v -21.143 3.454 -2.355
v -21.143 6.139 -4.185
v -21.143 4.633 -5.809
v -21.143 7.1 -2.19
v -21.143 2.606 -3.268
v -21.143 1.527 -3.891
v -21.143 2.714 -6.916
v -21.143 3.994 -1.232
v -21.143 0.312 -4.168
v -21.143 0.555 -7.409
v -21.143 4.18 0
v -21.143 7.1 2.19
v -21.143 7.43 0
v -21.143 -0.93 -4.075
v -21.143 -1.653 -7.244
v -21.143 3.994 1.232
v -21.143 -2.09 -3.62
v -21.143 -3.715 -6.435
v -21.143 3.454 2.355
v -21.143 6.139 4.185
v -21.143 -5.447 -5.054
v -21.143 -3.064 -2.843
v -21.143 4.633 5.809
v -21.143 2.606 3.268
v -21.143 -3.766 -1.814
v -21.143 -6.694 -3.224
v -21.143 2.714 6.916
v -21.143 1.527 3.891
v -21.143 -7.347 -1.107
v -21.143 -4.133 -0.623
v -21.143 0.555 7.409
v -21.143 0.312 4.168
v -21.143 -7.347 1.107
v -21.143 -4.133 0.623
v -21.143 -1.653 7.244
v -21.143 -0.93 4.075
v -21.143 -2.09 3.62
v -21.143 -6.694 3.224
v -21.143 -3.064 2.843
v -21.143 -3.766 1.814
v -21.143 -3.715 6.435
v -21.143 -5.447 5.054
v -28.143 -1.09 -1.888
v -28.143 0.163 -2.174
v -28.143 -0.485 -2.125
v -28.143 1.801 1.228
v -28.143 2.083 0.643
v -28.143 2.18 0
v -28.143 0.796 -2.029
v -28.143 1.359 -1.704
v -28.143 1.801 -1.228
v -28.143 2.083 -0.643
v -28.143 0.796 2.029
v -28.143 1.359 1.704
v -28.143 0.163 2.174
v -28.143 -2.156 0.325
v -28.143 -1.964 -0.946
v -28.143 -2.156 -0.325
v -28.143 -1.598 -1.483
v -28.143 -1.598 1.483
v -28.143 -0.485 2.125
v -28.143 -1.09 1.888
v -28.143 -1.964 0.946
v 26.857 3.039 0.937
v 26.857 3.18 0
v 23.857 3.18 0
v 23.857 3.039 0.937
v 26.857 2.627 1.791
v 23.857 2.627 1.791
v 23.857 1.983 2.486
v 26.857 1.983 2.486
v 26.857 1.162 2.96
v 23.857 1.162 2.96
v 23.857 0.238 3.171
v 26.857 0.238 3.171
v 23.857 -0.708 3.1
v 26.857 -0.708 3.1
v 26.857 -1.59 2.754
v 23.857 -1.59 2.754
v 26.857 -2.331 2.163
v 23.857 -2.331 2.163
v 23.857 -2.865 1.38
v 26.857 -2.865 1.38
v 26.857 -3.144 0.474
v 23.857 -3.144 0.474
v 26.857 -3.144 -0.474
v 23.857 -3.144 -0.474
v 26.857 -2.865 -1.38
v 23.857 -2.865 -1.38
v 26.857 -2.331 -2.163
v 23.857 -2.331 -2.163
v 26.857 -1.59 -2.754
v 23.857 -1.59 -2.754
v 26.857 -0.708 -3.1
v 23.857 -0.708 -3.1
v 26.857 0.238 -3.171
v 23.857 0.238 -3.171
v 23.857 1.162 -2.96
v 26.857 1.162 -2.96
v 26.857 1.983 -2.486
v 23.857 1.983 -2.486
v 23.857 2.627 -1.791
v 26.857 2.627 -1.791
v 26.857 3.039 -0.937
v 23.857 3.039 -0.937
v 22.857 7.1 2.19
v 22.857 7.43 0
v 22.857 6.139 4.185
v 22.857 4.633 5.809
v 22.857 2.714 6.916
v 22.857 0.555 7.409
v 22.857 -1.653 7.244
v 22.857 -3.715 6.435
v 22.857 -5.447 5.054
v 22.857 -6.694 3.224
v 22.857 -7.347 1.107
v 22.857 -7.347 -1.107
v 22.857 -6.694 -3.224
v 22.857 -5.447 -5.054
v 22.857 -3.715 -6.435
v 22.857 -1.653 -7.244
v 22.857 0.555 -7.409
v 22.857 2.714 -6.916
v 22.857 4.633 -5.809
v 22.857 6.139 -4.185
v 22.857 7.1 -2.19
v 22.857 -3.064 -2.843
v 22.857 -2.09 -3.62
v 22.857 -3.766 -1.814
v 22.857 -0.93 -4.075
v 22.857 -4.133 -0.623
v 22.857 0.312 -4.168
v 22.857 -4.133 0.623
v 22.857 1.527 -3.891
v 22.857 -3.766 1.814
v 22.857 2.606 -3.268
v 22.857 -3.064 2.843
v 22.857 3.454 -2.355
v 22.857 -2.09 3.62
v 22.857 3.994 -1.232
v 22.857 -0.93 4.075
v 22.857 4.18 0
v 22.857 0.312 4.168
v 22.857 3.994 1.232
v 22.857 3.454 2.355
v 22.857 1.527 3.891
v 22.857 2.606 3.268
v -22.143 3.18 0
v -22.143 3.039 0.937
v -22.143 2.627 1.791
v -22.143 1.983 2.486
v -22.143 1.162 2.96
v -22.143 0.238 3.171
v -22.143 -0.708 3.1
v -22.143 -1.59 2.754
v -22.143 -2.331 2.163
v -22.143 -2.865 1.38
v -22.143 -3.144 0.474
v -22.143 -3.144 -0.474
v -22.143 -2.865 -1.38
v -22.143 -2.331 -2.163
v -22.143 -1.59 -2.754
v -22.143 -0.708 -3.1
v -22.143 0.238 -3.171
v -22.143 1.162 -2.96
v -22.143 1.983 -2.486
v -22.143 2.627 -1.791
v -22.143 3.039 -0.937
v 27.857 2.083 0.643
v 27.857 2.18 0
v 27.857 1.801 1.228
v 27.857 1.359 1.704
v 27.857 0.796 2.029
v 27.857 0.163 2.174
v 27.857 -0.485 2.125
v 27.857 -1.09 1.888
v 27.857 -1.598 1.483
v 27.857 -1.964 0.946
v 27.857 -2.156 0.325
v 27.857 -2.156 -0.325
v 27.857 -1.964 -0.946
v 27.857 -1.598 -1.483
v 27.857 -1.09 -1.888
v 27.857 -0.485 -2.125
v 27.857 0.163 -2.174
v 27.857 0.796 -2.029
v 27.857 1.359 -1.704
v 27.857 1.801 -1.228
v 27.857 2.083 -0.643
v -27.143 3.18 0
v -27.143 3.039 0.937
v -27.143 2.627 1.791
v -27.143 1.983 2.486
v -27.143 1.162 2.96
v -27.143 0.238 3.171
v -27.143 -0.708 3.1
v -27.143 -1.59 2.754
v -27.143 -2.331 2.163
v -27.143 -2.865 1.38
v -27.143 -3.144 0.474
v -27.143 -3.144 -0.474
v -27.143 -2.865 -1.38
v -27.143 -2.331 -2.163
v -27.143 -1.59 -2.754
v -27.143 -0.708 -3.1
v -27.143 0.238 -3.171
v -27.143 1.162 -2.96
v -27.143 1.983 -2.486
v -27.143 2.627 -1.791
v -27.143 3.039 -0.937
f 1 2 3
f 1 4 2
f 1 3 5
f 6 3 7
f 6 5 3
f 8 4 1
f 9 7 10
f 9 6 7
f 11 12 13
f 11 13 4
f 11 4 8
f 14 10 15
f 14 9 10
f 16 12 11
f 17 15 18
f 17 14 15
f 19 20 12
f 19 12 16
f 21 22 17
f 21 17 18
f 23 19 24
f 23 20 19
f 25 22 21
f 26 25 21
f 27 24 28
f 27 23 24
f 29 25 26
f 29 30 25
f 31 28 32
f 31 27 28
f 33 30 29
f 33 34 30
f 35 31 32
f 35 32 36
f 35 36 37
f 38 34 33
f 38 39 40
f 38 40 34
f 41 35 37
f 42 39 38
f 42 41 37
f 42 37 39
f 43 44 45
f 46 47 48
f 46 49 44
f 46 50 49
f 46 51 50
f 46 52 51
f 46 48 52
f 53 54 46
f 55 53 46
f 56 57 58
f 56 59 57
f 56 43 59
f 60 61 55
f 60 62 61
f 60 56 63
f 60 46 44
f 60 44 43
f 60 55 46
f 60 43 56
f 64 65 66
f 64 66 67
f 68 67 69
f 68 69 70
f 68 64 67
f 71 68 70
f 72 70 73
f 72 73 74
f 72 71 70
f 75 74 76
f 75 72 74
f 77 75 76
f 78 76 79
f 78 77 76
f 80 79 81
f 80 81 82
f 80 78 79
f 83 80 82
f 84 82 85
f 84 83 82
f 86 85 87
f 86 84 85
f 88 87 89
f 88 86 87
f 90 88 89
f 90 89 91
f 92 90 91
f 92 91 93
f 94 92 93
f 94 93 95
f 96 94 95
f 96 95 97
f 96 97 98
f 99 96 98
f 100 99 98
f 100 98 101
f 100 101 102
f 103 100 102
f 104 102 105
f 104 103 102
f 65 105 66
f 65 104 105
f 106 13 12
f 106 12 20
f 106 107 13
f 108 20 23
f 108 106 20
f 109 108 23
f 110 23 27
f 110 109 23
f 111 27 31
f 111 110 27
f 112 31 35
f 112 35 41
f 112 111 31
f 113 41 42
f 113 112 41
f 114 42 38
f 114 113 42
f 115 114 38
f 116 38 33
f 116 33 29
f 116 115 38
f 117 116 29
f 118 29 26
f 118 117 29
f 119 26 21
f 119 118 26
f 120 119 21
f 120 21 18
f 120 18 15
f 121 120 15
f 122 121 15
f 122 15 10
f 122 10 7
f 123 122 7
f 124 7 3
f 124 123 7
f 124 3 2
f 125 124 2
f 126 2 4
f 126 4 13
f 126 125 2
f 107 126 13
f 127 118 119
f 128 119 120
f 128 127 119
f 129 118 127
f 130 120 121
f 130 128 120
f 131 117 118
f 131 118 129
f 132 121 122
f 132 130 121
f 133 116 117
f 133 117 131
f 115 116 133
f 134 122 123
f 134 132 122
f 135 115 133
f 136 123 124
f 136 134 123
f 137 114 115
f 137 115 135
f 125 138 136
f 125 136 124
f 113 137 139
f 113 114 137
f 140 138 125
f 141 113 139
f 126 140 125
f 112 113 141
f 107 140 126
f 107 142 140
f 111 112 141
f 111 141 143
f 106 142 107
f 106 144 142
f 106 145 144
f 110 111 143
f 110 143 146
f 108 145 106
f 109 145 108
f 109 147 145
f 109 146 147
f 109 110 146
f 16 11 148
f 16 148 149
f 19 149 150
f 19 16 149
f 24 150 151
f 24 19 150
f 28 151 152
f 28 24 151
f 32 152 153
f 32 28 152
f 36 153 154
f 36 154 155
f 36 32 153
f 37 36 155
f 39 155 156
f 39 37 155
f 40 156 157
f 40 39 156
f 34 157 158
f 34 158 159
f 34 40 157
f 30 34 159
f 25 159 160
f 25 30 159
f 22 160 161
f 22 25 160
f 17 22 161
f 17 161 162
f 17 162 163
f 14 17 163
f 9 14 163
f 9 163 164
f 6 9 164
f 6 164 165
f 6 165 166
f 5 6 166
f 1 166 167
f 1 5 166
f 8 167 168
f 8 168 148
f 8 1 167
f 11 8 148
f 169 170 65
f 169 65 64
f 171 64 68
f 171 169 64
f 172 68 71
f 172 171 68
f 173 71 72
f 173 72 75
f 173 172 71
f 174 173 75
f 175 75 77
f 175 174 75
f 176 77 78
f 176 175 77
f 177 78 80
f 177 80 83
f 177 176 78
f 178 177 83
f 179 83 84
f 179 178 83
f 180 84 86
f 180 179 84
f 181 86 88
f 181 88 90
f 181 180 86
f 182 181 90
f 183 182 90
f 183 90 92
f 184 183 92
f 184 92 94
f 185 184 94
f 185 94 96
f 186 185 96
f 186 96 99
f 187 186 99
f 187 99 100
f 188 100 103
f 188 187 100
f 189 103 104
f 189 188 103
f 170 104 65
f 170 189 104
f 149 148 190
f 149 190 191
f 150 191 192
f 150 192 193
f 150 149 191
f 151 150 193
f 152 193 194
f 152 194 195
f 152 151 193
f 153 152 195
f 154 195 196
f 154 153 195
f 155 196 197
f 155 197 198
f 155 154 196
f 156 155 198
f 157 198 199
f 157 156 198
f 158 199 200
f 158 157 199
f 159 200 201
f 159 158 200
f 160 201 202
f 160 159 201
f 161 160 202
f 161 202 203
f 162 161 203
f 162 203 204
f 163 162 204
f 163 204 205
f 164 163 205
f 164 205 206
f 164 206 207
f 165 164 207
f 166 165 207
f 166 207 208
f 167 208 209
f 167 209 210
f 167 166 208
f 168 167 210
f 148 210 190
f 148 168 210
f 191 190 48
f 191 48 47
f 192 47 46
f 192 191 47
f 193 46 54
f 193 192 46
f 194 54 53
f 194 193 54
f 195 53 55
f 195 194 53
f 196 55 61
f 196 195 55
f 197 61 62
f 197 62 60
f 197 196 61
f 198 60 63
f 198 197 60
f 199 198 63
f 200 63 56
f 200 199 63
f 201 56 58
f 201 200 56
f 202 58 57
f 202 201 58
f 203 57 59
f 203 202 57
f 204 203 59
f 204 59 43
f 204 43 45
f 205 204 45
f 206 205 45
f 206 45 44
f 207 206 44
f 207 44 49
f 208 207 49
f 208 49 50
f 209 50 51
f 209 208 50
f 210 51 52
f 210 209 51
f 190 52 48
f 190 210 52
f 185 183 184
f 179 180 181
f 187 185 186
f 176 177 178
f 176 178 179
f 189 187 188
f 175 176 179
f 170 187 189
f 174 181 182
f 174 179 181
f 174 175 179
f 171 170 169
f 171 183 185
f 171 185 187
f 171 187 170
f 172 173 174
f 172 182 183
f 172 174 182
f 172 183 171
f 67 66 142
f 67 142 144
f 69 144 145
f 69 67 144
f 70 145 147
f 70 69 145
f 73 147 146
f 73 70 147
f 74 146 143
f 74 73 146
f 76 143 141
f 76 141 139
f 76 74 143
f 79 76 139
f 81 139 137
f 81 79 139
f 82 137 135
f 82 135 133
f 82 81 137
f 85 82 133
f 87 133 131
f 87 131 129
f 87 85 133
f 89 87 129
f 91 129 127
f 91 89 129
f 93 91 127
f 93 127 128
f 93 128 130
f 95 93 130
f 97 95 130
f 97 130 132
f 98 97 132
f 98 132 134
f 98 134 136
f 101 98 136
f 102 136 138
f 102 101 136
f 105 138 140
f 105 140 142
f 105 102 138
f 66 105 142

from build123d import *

# Parameters (mm, degrees)
CHAMFER1_SIZE = 1
CHAMFER2_SIZE = 1


with BuildPart() as part:
    # Sketch1 → Revolve1 (revolve)
    with BuildSketch(Plane.XY):
        Polygon((-28.142857143, 0), (-28.142857143, 3.18), (-21.142857143, 3.18), (-21.142857143, 7.43), (22.857142857, 7.43), (22.857142857, 3.18), (27.857142857, 3.18), (27.857142857, 0), align=None)
    revolve(axis=Axis((-28.142857143, 0, 0), (1, 0, 0)))

    # Chamfer1
    chamfer1_edges = [part.edges().sort_by_distance(p)[0] for p in [
        (27.857142857, -3.18, 0),
        (-28.142857143, -3.18, 0),
    ]]
    chamfer(chamfer1_edges, length=CHAMFER1_SIZE)

    # Chamfer2
    chamfer2_edges = [part.edges().sort_by_distance(p)[0] for p in [
        (22.857142857, -3.18, 0),
        (-21.142857143, -3.18, 0),
    ]]
    chamfer(chamfer2_edges, length=CHAMFER2_SIZE)


solid = part.part
